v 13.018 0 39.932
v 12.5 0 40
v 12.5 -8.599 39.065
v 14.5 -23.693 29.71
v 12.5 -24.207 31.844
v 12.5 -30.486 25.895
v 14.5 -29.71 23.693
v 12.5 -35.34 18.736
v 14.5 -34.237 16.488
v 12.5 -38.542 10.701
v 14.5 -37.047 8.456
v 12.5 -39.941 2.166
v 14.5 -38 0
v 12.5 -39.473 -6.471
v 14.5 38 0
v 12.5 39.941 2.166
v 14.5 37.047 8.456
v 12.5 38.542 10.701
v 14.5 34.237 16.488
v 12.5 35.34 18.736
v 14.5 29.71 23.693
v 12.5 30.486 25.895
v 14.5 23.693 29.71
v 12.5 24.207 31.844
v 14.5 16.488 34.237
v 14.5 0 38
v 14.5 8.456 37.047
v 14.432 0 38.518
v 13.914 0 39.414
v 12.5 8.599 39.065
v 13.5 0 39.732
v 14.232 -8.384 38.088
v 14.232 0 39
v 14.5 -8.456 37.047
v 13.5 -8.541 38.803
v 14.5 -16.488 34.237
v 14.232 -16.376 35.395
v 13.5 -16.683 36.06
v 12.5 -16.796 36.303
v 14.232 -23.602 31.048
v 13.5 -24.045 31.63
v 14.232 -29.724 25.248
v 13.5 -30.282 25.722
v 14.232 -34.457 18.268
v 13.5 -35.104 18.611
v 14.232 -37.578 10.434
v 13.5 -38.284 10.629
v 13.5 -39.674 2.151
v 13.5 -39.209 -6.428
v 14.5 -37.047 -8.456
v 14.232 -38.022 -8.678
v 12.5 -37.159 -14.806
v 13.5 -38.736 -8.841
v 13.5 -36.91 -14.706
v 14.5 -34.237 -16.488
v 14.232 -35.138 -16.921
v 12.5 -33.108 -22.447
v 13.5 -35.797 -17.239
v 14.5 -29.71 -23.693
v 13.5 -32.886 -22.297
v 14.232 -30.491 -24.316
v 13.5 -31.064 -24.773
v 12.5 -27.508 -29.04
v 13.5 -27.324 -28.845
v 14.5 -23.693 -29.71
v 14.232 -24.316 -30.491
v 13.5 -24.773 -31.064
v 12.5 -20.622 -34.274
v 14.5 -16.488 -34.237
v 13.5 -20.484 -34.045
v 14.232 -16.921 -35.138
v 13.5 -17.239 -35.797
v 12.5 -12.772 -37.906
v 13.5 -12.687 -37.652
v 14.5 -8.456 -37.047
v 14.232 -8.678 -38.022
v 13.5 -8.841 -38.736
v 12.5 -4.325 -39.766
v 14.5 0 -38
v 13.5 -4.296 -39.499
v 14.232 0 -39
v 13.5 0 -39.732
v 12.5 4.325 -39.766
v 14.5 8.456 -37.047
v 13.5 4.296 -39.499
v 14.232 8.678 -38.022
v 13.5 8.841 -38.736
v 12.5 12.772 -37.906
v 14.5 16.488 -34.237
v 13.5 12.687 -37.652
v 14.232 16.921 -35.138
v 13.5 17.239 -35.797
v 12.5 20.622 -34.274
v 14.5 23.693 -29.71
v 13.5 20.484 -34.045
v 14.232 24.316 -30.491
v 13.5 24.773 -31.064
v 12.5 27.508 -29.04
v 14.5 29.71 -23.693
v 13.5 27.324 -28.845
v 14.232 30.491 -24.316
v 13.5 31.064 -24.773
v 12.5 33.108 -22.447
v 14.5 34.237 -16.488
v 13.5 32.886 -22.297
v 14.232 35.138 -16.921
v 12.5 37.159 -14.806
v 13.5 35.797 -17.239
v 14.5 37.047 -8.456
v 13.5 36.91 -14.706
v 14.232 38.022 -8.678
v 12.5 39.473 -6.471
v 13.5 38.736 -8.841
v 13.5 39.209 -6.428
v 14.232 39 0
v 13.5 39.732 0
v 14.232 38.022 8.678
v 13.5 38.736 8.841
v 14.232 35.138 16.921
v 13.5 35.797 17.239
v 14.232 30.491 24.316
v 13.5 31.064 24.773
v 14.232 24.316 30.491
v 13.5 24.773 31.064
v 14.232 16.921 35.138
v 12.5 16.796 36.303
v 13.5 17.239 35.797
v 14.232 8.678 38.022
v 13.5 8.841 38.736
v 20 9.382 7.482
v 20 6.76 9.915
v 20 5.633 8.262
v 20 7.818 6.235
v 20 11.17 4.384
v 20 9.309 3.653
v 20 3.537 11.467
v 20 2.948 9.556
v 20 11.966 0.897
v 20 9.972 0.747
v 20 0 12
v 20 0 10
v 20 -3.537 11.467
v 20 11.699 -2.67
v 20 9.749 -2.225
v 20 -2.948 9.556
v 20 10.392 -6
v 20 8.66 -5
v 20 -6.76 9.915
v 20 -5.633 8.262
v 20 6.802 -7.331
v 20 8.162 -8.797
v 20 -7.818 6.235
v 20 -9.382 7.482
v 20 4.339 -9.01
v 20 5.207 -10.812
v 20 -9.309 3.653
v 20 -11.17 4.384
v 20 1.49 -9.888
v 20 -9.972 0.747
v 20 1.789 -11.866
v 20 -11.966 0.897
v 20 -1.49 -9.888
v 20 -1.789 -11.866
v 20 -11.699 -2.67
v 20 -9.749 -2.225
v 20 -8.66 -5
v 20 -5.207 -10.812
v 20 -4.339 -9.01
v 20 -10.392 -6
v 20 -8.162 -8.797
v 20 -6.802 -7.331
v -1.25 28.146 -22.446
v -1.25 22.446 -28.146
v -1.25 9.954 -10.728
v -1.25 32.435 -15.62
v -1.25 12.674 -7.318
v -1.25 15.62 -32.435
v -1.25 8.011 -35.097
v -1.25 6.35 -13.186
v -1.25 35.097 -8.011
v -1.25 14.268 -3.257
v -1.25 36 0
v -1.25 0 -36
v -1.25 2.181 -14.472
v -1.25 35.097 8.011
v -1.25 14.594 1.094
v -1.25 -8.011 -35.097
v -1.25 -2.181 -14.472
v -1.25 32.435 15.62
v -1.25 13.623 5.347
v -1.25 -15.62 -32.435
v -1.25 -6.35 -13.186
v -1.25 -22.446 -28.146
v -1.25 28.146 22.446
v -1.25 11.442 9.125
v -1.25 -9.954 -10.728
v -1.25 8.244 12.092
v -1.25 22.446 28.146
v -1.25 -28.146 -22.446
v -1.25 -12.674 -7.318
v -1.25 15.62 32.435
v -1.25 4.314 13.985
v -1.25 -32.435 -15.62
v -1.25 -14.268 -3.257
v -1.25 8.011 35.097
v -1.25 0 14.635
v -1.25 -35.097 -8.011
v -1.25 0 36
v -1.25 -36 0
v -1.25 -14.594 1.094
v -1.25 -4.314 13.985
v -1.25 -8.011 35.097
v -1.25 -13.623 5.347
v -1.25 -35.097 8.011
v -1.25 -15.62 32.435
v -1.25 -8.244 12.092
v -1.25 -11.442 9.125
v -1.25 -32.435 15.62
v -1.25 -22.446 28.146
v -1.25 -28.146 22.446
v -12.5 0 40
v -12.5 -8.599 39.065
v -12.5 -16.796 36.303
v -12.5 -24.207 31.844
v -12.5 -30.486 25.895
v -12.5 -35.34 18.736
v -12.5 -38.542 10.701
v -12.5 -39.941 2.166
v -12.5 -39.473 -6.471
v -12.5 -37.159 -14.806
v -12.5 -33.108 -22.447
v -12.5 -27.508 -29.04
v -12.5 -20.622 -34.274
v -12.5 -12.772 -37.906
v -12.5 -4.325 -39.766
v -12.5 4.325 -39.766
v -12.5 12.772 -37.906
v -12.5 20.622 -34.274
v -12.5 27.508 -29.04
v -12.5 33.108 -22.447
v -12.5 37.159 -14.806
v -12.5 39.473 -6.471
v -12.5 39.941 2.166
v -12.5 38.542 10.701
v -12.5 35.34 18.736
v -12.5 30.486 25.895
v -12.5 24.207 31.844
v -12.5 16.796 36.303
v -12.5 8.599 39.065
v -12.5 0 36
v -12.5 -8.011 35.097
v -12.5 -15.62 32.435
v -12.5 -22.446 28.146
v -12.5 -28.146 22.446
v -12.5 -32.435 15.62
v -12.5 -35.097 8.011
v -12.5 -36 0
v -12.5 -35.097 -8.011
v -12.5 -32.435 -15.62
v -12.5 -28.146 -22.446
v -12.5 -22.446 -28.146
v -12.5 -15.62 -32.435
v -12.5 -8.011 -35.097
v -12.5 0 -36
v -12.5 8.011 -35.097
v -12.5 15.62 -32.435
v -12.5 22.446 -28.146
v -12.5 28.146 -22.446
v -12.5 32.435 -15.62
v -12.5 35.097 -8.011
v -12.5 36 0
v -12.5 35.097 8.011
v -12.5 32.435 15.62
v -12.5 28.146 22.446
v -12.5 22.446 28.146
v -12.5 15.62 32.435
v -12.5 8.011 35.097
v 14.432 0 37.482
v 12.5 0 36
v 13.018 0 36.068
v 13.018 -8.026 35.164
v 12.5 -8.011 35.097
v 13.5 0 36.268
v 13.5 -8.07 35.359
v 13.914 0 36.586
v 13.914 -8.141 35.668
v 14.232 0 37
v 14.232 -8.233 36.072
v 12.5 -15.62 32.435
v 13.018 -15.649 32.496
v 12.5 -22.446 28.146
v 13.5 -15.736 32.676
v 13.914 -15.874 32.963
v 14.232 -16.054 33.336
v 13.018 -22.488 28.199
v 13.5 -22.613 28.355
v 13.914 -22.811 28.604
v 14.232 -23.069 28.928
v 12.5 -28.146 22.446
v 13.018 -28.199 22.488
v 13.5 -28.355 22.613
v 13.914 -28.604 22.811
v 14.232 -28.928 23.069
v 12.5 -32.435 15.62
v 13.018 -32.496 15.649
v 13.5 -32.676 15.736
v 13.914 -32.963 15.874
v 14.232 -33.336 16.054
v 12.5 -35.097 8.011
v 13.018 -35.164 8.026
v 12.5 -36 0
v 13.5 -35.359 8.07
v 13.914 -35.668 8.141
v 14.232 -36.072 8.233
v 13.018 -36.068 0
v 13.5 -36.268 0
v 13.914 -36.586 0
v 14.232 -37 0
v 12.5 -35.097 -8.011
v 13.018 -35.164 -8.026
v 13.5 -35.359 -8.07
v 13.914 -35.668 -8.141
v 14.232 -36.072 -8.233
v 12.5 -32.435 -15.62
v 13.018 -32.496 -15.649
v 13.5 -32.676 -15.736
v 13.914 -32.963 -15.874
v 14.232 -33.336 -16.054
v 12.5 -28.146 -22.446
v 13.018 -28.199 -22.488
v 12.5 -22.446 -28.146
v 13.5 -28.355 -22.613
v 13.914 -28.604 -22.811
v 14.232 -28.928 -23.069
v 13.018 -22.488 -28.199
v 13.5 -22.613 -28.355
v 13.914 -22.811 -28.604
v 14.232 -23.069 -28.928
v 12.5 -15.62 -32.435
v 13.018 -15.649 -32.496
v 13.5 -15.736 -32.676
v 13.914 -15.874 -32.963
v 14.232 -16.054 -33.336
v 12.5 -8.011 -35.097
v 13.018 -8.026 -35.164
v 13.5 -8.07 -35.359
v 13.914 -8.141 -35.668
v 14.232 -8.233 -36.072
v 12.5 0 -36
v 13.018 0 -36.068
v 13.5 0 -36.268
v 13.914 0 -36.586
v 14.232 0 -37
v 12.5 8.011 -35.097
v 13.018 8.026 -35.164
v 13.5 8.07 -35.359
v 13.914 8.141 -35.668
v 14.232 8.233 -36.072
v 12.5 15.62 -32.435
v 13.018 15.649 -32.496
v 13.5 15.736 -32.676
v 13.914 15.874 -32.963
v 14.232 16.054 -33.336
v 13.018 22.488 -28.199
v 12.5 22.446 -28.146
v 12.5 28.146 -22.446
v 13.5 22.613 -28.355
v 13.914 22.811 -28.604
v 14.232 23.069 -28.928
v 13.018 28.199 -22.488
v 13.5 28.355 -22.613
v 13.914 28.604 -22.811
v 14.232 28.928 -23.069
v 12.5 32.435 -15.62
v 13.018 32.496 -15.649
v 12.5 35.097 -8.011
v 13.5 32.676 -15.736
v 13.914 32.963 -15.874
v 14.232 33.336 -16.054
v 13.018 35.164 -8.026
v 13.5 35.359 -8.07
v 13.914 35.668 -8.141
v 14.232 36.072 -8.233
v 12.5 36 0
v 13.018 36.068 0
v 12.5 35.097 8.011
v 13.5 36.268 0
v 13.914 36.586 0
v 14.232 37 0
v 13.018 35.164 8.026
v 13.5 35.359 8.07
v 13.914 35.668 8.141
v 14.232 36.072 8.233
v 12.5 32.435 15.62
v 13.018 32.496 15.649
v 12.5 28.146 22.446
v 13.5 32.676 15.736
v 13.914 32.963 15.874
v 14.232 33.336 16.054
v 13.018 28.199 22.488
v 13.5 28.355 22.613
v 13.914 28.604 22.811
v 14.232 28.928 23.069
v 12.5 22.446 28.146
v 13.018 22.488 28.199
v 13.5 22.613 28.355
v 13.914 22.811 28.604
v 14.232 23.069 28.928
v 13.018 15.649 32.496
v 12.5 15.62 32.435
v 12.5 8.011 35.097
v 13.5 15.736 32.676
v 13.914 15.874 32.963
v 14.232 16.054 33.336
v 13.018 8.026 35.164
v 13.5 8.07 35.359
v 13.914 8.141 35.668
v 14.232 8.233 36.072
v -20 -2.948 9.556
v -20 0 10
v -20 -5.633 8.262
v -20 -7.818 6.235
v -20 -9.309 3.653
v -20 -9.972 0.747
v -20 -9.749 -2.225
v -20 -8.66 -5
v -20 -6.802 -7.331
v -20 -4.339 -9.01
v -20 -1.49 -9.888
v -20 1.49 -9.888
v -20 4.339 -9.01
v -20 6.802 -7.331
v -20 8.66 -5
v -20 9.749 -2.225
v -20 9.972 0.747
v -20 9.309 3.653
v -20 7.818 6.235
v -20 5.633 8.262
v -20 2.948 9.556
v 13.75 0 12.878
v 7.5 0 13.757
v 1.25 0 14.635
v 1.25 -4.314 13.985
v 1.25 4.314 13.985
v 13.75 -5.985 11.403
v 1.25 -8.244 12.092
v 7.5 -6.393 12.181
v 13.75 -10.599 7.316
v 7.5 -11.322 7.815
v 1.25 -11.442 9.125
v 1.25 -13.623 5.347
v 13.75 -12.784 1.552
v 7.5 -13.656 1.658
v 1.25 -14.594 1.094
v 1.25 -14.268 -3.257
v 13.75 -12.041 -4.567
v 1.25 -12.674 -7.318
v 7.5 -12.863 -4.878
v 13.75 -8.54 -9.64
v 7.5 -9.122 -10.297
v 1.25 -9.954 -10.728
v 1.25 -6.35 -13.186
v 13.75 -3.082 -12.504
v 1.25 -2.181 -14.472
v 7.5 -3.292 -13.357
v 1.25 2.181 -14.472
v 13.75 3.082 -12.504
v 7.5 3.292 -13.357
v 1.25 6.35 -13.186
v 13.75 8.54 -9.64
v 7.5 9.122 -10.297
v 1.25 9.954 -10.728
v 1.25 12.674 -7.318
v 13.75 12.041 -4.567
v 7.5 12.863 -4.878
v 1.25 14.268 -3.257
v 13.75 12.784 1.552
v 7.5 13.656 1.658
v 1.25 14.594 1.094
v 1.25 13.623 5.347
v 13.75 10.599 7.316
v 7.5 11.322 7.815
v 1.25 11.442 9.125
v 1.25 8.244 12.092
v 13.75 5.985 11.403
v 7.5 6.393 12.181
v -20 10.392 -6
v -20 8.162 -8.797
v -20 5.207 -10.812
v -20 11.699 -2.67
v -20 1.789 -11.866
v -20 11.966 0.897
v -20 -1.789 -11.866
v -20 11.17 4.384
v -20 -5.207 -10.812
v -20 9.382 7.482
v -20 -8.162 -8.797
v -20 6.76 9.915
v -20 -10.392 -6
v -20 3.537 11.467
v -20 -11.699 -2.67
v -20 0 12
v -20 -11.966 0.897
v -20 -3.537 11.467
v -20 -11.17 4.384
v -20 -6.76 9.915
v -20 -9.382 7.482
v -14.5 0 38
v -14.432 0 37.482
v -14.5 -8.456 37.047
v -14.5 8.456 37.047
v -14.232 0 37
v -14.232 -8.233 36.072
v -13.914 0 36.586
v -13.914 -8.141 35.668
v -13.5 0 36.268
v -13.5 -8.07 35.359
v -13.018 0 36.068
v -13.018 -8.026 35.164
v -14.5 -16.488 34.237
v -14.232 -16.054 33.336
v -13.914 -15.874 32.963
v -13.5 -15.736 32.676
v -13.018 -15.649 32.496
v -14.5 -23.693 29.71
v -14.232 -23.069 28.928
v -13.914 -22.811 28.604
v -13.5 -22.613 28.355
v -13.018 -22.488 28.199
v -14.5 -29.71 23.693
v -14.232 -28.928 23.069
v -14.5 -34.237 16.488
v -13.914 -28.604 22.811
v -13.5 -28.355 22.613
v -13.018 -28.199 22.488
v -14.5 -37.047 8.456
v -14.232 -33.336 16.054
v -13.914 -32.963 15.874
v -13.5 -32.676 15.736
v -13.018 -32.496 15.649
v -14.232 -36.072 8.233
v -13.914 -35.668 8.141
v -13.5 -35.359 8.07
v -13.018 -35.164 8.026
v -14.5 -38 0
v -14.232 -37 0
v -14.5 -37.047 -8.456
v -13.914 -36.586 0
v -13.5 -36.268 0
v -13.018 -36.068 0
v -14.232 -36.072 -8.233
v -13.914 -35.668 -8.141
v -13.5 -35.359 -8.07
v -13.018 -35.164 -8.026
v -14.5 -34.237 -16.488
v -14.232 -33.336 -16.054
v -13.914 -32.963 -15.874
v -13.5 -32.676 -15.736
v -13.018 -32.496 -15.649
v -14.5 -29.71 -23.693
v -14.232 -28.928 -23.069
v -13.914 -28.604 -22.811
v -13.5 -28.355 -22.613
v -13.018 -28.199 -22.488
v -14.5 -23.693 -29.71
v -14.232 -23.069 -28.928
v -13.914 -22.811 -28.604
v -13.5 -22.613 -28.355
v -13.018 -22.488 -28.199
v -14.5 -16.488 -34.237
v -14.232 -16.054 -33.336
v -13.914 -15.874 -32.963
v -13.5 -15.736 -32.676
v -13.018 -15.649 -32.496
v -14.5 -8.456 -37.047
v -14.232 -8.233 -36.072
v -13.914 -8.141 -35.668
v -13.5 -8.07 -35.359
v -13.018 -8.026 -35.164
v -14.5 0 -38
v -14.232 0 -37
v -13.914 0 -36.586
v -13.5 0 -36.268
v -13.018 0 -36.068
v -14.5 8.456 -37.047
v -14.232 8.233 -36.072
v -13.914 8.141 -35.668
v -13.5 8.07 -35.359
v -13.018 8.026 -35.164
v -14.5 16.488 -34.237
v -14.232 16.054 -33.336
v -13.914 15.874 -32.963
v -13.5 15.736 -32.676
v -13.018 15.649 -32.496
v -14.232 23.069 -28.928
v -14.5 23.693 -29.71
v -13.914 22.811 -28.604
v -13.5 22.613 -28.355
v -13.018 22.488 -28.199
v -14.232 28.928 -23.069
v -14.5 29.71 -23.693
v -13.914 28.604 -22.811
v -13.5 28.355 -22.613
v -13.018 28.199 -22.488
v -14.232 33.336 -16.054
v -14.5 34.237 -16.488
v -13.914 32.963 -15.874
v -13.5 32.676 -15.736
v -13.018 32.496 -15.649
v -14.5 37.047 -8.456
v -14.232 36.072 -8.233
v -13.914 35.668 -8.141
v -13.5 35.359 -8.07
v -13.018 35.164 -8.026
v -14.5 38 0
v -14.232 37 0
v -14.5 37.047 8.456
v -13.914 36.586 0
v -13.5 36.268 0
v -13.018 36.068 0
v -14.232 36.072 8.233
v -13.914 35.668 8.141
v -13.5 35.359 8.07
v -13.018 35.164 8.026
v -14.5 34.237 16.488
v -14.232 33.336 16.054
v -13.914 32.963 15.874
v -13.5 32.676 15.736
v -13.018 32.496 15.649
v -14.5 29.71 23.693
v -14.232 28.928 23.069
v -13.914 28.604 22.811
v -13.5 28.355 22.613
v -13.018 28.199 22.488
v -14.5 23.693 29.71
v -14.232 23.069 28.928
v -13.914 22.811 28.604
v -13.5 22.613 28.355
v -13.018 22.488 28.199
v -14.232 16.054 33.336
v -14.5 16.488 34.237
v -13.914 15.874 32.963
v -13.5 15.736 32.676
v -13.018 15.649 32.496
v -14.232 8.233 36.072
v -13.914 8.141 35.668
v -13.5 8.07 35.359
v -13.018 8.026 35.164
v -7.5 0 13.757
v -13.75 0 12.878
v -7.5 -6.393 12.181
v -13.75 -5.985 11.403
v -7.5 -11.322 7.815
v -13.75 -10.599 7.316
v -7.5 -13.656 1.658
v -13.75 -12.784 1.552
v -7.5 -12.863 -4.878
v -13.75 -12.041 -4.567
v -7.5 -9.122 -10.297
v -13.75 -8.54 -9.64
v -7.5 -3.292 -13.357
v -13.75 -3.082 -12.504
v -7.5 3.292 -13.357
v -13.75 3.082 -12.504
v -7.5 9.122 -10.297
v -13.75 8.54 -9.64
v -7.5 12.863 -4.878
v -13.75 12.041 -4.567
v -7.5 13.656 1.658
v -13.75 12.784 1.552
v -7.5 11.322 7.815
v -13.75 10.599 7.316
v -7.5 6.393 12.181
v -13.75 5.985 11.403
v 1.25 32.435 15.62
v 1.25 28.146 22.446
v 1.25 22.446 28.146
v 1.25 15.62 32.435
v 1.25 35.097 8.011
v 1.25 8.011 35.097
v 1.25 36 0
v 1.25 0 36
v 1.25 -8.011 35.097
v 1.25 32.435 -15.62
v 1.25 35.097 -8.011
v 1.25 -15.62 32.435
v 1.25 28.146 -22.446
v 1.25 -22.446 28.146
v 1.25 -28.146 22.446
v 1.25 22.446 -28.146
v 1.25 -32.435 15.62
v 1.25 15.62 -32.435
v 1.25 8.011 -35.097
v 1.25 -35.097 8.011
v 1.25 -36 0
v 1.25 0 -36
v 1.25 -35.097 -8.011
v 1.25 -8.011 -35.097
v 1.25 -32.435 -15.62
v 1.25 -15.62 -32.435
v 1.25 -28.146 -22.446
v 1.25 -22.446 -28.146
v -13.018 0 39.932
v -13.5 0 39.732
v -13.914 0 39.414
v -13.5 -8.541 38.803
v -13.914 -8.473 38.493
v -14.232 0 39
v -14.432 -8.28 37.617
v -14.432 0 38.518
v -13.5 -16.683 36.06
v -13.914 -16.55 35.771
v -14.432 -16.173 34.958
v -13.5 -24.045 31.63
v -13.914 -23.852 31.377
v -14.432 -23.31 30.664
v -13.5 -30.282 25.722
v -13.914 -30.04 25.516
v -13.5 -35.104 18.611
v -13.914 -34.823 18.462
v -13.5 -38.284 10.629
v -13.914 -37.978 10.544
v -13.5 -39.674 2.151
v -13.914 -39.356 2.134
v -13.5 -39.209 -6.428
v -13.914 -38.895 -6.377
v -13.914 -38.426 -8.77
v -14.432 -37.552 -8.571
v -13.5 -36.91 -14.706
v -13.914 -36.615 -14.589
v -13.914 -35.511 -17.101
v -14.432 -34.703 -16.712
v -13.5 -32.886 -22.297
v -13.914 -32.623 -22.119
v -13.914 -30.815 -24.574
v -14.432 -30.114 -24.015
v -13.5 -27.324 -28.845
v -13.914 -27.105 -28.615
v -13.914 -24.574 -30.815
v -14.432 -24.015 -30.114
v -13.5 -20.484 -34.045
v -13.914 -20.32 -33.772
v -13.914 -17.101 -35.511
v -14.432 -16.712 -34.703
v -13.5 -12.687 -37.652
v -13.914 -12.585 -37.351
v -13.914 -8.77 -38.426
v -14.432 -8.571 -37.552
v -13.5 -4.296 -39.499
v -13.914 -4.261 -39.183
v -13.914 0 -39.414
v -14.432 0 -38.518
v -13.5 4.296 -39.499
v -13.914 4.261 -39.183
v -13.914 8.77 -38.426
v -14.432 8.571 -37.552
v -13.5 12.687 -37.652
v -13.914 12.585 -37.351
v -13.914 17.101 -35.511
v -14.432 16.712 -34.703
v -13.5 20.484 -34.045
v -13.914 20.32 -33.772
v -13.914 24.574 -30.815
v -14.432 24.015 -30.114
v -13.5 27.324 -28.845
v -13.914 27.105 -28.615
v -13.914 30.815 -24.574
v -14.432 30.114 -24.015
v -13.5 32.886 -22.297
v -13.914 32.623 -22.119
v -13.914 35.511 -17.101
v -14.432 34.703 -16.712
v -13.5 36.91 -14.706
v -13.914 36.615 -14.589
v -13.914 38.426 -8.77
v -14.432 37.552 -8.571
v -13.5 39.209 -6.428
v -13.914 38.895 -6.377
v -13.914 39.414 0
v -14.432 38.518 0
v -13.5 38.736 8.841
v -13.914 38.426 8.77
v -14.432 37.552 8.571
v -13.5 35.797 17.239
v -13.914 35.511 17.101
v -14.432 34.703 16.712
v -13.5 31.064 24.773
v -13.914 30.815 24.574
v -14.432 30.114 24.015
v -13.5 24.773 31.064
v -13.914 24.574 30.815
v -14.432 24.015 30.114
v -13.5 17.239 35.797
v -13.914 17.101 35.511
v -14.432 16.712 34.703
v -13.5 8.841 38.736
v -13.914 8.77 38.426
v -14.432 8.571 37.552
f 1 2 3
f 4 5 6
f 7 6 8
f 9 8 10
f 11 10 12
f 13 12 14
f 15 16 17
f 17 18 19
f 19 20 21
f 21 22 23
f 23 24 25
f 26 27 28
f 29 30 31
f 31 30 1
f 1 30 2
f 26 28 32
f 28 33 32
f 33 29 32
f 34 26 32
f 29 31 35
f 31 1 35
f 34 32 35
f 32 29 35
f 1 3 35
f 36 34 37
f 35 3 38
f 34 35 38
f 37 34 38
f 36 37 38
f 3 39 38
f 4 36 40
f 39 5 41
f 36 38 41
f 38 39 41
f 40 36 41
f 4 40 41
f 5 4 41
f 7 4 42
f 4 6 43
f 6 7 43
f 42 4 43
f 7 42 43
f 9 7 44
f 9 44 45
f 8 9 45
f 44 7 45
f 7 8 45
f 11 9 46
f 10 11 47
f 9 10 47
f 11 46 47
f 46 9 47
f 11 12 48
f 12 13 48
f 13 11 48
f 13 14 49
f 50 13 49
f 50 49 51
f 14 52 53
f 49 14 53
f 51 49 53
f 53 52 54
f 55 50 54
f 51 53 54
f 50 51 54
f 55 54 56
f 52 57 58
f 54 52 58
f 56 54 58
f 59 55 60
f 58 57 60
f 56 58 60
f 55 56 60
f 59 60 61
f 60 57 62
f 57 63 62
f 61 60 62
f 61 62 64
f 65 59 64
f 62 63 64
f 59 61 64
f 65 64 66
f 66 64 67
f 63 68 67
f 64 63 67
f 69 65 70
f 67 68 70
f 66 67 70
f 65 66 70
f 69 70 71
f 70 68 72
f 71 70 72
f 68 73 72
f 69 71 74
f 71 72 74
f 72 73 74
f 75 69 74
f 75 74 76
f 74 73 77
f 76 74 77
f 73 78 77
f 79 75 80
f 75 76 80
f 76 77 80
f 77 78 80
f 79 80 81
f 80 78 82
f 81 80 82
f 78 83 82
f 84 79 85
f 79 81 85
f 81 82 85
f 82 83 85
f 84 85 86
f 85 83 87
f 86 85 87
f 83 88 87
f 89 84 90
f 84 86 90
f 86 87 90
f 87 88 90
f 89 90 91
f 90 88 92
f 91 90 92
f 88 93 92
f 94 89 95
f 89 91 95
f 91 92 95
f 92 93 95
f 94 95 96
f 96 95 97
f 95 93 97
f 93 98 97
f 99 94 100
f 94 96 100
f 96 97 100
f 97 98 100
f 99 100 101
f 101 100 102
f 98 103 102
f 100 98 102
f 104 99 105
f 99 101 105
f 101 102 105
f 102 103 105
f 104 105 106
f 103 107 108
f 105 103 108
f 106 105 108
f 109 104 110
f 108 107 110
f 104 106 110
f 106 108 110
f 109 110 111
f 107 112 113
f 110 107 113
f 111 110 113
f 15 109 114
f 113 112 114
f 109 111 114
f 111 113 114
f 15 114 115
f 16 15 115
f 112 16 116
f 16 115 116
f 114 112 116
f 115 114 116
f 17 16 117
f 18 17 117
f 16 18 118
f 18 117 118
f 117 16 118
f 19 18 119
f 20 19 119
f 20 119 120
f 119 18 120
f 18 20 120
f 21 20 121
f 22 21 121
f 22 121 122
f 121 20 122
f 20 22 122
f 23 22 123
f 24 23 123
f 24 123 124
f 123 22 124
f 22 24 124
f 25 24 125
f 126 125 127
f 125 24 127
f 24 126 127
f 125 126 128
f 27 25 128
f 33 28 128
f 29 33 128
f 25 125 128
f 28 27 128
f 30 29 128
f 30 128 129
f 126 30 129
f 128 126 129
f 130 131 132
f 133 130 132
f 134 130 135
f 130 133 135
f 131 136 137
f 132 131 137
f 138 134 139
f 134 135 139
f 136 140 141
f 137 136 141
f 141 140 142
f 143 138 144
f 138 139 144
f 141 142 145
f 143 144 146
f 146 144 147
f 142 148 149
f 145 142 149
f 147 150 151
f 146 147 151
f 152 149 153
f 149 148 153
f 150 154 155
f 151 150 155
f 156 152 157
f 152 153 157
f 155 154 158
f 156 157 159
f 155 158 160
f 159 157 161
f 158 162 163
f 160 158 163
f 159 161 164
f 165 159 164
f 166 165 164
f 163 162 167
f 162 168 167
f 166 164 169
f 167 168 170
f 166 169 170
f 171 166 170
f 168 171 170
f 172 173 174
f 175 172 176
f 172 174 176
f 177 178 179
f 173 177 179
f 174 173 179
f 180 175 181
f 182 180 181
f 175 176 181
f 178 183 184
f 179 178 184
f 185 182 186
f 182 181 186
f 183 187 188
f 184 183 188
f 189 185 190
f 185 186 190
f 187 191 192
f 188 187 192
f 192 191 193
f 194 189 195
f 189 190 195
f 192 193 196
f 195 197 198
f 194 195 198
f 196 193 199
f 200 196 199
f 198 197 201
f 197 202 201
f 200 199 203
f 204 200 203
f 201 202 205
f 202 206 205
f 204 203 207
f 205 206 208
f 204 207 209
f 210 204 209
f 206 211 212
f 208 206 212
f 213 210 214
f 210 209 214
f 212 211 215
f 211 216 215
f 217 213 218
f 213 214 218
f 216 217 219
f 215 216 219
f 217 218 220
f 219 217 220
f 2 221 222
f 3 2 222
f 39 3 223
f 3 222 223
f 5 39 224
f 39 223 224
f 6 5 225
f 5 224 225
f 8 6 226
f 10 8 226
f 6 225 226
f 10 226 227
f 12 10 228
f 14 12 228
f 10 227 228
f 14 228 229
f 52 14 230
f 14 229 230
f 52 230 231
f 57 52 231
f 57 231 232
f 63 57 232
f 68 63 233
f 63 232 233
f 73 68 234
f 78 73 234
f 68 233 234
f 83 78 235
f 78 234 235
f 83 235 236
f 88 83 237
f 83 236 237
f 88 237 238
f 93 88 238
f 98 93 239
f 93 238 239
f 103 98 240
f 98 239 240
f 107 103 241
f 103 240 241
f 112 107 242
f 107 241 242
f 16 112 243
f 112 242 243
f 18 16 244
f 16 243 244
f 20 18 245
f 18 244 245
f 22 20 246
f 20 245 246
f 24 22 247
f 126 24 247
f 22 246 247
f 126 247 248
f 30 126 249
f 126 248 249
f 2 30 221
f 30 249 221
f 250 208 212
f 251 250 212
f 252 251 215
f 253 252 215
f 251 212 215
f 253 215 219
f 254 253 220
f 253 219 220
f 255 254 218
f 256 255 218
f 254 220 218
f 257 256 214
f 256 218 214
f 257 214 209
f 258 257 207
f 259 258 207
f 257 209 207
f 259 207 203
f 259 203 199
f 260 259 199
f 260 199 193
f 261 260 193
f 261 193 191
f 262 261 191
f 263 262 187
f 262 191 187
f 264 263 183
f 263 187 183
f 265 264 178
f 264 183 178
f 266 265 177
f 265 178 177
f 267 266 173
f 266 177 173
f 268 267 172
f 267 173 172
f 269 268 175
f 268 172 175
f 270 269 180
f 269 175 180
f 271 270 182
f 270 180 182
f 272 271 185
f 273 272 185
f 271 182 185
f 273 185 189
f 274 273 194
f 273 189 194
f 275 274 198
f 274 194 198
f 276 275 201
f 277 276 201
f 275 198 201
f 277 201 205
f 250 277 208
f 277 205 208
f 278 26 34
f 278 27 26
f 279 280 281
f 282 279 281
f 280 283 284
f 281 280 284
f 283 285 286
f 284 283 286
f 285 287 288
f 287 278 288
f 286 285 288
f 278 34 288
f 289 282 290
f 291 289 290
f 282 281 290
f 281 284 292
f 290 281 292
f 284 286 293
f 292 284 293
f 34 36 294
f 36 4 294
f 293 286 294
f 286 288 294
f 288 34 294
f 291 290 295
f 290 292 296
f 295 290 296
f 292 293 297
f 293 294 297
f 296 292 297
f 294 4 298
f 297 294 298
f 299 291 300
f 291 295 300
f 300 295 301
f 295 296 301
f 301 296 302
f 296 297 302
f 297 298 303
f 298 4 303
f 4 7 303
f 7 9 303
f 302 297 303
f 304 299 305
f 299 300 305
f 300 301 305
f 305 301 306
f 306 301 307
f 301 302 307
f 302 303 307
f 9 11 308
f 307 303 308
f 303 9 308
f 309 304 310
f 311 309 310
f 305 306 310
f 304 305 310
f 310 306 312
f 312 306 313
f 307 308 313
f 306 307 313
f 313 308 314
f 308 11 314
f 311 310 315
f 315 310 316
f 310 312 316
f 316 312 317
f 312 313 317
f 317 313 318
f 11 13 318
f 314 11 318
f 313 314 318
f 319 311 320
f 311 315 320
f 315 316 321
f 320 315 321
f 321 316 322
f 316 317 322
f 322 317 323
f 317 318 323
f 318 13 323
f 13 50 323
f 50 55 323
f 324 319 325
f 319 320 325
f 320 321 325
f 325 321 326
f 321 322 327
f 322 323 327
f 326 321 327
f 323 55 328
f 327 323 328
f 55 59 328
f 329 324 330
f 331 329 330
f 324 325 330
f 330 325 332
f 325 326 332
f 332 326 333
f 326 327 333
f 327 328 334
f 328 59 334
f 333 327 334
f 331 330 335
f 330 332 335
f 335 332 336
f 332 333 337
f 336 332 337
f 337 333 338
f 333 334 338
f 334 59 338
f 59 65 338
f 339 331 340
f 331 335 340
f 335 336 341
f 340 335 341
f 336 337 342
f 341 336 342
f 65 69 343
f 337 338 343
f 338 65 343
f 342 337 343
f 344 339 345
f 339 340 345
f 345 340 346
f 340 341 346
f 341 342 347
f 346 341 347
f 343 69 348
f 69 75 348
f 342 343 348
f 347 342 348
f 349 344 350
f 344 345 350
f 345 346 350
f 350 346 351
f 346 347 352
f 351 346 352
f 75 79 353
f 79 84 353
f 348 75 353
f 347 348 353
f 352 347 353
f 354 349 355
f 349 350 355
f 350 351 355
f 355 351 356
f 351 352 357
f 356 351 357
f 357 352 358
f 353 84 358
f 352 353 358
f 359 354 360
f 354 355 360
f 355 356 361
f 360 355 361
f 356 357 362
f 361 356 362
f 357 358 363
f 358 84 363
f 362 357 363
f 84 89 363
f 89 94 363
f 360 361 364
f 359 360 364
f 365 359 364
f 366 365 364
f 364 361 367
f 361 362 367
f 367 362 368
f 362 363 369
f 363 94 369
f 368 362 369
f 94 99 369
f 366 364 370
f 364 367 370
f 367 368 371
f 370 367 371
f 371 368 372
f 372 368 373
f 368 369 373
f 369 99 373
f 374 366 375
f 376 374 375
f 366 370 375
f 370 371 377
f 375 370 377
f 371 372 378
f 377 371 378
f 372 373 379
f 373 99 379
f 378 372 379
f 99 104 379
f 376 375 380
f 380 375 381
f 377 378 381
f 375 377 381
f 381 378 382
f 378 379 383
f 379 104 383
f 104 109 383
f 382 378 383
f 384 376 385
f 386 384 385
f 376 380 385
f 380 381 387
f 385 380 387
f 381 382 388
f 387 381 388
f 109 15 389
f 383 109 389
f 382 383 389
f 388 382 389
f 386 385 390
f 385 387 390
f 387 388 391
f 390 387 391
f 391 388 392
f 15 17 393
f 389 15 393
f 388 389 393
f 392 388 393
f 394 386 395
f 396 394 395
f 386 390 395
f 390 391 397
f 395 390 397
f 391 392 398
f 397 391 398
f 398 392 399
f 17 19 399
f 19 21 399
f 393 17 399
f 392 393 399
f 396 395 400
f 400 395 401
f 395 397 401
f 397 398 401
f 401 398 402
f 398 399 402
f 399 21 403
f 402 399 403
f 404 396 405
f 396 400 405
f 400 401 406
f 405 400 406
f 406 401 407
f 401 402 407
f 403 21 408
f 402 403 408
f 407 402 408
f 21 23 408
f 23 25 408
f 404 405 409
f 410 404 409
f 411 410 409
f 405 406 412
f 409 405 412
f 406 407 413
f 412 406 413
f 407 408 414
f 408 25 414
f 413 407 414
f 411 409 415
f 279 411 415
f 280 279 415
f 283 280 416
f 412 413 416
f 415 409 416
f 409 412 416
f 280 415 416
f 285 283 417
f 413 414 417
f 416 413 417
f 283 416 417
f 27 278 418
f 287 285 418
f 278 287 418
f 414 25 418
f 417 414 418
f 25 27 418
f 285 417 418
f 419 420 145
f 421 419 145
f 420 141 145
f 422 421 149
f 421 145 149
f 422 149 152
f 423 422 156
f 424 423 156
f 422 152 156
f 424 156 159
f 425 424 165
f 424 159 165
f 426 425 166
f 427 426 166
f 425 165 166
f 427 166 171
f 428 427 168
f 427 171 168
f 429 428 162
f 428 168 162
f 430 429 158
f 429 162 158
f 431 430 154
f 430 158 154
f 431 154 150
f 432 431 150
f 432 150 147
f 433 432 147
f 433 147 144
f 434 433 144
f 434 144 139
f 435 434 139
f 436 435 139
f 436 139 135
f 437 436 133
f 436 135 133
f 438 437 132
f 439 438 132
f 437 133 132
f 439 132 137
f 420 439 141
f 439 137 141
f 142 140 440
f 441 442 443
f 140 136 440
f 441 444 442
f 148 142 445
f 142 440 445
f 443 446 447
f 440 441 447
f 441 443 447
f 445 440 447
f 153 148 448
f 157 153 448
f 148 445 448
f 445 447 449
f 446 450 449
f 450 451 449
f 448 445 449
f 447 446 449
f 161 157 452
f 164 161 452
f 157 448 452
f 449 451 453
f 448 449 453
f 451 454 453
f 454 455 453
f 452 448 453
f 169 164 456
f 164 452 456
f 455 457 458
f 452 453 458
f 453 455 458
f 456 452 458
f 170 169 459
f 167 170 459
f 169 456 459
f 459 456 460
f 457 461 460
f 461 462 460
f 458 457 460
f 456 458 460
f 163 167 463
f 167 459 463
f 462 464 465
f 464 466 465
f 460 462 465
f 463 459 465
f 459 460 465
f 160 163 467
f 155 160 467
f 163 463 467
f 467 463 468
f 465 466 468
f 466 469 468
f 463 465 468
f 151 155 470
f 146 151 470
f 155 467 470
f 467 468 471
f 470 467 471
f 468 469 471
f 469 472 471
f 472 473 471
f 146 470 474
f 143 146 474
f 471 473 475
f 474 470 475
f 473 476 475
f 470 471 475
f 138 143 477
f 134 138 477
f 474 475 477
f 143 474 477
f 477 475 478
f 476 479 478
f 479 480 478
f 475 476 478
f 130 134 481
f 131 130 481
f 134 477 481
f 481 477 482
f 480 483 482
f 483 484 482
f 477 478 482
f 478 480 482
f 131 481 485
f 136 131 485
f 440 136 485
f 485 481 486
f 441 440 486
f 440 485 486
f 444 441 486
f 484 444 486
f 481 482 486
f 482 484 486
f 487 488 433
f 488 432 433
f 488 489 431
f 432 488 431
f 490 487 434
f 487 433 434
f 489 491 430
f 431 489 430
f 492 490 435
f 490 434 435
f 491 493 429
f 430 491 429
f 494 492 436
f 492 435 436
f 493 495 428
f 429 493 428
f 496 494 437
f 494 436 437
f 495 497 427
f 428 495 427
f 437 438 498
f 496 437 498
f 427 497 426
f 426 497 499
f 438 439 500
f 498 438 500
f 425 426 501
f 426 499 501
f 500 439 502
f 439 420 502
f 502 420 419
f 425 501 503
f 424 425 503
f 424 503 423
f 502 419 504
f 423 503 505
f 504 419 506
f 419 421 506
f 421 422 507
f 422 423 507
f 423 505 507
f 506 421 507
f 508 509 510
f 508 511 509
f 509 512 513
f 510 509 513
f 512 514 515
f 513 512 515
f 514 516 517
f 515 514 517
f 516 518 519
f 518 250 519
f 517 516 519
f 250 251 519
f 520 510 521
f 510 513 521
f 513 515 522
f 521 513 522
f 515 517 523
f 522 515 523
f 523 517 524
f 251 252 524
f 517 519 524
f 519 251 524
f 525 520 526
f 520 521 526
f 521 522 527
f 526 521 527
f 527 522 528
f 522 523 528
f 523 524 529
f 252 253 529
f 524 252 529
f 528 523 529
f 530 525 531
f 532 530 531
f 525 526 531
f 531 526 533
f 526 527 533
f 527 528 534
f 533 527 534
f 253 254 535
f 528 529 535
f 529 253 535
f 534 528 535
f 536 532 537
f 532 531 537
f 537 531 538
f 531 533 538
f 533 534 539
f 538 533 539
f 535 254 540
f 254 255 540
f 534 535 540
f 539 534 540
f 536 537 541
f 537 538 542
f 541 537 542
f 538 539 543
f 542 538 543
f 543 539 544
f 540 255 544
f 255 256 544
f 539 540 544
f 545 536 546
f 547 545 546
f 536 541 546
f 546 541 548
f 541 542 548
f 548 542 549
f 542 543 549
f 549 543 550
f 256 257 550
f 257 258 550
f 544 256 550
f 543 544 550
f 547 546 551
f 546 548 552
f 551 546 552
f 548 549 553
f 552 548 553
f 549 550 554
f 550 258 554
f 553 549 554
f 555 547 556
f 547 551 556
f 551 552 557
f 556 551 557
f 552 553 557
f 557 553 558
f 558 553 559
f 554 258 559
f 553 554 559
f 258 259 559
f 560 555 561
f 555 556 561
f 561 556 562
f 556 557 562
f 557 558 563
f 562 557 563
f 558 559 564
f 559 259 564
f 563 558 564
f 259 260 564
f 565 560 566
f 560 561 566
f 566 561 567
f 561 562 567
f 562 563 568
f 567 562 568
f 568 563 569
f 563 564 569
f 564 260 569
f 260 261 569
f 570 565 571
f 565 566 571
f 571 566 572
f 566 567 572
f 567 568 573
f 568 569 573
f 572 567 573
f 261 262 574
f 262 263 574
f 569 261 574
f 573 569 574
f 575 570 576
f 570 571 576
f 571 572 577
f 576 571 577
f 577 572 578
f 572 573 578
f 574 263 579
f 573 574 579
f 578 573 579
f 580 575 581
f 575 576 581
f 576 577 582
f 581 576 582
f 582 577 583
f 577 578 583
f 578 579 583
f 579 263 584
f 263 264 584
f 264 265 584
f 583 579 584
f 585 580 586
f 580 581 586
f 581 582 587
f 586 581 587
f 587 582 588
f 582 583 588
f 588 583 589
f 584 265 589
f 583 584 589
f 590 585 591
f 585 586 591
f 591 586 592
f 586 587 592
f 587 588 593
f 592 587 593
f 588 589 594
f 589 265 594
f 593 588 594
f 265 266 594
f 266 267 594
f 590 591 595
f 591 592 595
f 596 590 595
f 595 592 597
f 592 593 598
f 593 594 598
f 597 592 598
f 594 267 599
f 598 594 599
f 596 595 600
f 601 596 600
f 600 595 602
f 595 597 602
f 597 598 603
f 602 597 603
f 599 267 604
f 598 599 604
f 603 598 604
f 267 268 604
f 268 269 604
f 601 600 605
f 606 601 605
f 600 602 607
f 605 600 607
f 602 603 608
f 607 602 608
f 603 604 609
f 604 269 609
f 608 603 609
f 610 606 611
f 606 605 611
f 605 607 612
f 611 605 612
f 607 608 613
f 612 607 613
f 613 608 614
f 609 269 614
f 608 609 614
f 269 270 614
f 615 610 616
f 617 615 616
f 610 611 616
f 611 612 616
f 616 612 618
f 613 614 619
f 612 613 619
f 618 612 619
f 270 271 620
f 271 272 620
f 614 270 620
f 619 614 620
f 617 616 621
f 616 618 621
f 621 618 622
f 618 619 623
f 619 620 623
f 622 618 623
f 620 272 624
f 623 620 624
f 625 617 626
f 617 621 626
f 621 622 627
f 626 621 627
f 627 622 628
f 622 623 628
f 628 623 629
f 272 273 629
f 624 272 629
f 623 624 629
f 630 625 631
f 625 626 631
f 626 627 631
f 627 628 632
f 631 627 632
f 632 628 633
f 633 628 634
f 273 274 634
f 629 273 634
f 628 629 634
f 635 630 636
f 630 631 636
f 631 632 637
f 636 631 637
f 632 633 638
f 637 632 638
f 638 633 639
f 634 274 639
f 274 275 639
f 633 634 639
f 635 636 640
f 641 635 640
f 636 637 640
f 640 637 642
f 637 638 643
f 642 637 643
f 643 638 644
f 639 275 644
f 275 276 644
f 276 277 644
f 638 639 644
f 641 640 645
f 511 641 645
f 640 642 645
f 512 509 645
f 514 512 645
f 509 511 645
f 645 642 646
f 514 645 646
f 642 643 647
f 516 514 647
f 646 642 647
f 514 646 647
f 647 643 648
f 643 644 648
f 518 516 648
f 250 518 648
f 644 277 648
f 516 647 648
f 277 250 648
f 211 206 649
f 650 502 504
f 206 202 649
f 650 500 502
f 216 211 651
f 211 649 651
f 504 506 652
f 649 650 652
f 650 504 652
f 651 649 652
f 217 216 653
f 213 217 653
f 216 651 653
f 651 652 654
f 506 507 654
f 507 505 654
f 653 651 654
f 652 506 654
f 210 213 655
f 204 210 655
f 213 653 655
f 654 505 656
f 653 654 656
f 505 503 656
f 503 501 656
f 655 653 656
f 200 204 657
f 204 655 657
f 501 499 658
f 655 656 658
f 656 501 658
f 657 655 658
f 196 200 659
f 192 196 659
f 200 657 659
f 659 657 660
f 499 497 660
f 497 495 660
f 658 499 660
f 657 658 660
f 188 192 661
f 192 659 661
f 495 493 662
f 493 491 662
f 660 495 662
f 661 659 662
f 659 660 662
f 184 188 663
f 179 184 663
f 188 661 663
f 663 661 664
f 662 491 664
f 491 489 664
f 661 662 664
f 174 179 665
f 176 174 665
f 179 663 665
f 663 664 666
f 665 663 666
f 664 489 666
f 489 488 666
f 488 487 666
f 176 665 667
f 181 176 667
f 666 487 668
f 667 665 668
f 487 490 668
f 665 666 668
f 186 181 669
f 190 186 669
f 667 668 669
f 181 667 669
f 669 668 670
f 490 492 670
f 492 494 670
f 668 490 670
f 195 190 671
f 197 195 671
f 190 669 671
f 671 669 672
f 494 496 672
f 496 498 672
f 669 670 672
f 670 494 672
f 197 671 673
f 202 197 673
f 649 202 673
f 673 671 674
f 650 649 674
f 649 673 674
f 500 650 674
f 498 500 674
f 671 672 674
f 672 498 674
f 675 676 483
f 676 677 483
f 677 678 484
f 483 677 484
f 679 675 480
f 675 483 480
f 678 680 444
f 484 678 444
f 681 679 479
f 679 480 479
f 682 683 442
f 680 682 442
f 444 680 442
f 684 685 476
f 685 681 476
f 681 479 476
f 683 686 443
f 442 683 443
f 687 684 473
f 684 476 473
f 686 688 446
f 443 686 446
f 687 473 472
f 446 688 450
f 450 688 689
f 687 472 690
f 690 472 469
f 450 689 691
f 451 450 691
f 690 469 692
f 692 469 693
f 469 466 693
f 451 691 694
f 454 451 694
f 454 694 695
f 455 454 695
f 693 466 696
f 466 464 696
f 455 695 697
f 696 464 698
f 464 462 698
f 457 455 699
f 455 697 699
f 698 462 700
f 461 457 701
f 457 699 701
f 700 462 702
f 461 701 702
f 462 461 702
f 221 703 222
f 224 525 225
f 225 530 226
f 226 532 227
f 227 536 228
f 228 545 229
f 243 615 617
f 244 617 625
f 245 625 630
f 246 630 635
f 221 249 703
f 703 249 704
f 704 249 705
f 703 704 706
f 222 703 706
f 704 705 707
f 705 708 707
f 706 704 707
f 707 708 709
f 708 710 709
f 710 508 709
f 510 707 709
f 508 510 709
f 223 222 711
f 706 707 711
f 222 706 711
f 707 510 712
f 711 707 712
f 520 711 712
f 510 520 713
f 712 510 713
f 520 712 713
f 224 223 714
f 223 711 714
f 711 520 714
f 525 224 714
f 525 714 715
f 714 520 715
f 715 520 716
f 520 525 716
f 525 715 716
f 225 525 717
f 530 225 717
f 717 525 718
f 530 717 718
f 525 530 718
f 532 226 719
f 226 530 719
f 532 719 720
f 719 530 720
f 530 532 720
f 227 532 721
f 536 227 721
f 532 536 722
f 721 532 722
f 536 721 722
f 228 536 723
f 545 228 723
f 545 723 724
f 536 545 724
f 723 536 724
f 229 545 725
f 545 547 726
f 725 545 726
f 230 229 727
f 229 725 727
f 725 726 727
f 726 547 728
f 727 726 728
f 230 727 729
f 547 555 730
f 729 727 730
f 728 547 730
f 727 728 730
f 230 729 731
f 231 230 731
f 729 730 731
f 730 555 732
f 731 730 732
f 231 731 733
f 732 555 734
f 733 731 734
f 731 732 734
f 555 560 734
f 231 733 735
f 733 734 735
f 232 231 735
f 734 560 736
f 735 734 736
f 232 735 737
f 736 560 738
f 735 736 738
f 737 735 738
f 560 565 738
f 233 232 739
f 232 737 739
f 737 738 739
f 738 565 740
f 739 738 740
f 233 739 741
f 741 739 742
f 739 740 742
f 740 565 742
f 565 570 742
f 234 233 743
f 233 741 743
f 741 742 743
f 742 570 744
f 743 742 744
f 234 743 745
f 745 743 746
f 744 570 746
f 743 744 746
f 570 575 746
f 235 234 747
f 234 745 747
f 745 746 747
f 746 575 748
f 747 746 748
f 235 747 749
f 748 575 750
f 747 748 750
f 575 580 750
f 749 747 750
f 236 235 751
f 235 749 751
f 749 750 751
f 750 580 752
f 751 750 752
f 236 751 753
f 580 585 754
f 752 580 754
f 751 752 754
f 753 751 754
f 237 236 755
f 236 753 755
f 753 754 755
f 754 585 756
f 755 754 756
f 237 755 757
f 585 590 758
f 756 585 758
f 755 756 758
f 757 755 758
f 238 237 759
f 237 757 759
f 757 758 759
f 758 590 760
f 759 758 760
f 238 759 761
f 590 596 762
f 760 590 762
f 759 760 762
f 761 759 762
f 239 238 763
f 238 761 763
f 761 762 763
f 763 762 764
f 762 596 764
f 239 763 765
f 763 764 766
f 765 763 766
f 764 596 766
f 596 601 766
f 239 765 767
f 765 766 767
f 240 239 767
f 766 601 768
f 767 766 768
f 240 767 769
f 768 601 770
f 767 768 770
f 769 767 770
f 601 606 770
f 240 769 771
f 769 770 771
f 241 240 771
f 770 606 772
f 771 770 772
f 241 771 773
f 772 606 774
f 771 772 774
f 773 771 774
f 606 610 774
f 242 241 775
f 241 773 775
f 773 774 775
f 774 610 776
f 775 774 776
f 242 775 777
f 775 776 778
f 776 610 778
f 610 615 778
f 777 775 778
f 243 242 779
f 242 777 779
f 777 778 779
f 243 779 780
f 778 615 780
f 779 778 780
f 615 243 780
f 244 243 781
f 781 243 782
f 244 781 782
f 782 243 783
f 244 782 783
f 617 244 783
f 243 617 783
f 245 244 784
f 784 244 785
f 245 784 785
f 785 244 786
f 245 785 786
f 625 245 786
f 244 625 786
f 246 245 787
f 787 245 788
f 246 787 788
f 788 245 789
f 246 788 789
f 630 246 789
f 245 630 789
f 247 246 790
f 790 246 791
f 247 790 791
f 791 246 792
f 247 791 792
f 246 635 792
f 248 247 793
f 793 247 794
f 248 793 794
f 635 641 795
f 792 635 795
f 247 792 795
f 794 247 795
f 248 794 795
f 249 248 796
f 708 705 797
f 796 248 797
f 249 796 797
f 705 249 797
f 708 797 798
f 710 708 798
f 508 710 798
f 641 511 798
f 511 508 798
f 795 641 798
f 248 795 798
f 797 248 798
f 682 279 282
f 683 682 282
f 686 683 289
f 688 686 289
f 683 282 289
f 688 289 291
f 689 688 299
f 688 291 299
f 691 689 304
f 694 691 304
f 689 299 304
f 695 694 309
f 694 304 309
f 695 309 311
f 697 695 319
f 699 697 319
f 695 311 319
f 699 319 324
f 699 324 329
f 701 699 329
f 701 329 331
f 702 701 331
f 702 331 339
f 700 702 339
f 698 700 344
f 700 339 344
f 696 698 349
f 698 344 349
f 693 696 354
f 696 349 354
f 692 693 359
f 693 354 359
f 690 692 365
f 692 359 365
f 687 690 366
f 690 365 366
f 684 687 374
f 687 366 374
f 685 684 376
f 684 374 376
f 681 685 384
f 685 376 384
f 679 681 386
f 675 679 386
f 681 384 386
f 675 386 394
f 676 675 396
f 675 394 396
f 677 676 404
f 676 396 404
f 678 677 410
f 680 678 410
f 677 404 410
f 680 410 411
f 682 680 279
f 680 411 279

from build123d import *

# Parameters (mm, degrees)
FILLET1_R = 2


with BuildPart() as part:
    # Sketch2 → Revolve1 (revolve)
    with BuildSketch(Plane.XY, mode=Mode.PRIVATE) as revolve1_sk:
        Polygon((-20, 10), (20, 10), (20, 12), (1.25, 14.635140651), (1.25, 36), (14.5, 36), (14.5, 40), (-14.5, 40), (-14.5, 36), (-1.25, 36), (-1.25, 14.635140651), (-20, 12), align=None)
    revolve(revolve1_sk.sketch.rotate(Axis((0, 0, 0), (1, 0, 0)), 90), axis=Axis((0, 0, 0), (1, 0, 0)))

    # Fillet1
    fillet1_edges = [part.edges().sort_by_distance(p)[0] for p in [
        (14.5, 0, -40),
        (-14.5, 0, -40),
        (-14.5, 0, -36),
        (14.5, 0, -36),
    ]]
    fillet(fillet1_edges, radius=FILLET1_R - 0.0001)  # a hair under: the kernel refuses the full size


solid = part.part
